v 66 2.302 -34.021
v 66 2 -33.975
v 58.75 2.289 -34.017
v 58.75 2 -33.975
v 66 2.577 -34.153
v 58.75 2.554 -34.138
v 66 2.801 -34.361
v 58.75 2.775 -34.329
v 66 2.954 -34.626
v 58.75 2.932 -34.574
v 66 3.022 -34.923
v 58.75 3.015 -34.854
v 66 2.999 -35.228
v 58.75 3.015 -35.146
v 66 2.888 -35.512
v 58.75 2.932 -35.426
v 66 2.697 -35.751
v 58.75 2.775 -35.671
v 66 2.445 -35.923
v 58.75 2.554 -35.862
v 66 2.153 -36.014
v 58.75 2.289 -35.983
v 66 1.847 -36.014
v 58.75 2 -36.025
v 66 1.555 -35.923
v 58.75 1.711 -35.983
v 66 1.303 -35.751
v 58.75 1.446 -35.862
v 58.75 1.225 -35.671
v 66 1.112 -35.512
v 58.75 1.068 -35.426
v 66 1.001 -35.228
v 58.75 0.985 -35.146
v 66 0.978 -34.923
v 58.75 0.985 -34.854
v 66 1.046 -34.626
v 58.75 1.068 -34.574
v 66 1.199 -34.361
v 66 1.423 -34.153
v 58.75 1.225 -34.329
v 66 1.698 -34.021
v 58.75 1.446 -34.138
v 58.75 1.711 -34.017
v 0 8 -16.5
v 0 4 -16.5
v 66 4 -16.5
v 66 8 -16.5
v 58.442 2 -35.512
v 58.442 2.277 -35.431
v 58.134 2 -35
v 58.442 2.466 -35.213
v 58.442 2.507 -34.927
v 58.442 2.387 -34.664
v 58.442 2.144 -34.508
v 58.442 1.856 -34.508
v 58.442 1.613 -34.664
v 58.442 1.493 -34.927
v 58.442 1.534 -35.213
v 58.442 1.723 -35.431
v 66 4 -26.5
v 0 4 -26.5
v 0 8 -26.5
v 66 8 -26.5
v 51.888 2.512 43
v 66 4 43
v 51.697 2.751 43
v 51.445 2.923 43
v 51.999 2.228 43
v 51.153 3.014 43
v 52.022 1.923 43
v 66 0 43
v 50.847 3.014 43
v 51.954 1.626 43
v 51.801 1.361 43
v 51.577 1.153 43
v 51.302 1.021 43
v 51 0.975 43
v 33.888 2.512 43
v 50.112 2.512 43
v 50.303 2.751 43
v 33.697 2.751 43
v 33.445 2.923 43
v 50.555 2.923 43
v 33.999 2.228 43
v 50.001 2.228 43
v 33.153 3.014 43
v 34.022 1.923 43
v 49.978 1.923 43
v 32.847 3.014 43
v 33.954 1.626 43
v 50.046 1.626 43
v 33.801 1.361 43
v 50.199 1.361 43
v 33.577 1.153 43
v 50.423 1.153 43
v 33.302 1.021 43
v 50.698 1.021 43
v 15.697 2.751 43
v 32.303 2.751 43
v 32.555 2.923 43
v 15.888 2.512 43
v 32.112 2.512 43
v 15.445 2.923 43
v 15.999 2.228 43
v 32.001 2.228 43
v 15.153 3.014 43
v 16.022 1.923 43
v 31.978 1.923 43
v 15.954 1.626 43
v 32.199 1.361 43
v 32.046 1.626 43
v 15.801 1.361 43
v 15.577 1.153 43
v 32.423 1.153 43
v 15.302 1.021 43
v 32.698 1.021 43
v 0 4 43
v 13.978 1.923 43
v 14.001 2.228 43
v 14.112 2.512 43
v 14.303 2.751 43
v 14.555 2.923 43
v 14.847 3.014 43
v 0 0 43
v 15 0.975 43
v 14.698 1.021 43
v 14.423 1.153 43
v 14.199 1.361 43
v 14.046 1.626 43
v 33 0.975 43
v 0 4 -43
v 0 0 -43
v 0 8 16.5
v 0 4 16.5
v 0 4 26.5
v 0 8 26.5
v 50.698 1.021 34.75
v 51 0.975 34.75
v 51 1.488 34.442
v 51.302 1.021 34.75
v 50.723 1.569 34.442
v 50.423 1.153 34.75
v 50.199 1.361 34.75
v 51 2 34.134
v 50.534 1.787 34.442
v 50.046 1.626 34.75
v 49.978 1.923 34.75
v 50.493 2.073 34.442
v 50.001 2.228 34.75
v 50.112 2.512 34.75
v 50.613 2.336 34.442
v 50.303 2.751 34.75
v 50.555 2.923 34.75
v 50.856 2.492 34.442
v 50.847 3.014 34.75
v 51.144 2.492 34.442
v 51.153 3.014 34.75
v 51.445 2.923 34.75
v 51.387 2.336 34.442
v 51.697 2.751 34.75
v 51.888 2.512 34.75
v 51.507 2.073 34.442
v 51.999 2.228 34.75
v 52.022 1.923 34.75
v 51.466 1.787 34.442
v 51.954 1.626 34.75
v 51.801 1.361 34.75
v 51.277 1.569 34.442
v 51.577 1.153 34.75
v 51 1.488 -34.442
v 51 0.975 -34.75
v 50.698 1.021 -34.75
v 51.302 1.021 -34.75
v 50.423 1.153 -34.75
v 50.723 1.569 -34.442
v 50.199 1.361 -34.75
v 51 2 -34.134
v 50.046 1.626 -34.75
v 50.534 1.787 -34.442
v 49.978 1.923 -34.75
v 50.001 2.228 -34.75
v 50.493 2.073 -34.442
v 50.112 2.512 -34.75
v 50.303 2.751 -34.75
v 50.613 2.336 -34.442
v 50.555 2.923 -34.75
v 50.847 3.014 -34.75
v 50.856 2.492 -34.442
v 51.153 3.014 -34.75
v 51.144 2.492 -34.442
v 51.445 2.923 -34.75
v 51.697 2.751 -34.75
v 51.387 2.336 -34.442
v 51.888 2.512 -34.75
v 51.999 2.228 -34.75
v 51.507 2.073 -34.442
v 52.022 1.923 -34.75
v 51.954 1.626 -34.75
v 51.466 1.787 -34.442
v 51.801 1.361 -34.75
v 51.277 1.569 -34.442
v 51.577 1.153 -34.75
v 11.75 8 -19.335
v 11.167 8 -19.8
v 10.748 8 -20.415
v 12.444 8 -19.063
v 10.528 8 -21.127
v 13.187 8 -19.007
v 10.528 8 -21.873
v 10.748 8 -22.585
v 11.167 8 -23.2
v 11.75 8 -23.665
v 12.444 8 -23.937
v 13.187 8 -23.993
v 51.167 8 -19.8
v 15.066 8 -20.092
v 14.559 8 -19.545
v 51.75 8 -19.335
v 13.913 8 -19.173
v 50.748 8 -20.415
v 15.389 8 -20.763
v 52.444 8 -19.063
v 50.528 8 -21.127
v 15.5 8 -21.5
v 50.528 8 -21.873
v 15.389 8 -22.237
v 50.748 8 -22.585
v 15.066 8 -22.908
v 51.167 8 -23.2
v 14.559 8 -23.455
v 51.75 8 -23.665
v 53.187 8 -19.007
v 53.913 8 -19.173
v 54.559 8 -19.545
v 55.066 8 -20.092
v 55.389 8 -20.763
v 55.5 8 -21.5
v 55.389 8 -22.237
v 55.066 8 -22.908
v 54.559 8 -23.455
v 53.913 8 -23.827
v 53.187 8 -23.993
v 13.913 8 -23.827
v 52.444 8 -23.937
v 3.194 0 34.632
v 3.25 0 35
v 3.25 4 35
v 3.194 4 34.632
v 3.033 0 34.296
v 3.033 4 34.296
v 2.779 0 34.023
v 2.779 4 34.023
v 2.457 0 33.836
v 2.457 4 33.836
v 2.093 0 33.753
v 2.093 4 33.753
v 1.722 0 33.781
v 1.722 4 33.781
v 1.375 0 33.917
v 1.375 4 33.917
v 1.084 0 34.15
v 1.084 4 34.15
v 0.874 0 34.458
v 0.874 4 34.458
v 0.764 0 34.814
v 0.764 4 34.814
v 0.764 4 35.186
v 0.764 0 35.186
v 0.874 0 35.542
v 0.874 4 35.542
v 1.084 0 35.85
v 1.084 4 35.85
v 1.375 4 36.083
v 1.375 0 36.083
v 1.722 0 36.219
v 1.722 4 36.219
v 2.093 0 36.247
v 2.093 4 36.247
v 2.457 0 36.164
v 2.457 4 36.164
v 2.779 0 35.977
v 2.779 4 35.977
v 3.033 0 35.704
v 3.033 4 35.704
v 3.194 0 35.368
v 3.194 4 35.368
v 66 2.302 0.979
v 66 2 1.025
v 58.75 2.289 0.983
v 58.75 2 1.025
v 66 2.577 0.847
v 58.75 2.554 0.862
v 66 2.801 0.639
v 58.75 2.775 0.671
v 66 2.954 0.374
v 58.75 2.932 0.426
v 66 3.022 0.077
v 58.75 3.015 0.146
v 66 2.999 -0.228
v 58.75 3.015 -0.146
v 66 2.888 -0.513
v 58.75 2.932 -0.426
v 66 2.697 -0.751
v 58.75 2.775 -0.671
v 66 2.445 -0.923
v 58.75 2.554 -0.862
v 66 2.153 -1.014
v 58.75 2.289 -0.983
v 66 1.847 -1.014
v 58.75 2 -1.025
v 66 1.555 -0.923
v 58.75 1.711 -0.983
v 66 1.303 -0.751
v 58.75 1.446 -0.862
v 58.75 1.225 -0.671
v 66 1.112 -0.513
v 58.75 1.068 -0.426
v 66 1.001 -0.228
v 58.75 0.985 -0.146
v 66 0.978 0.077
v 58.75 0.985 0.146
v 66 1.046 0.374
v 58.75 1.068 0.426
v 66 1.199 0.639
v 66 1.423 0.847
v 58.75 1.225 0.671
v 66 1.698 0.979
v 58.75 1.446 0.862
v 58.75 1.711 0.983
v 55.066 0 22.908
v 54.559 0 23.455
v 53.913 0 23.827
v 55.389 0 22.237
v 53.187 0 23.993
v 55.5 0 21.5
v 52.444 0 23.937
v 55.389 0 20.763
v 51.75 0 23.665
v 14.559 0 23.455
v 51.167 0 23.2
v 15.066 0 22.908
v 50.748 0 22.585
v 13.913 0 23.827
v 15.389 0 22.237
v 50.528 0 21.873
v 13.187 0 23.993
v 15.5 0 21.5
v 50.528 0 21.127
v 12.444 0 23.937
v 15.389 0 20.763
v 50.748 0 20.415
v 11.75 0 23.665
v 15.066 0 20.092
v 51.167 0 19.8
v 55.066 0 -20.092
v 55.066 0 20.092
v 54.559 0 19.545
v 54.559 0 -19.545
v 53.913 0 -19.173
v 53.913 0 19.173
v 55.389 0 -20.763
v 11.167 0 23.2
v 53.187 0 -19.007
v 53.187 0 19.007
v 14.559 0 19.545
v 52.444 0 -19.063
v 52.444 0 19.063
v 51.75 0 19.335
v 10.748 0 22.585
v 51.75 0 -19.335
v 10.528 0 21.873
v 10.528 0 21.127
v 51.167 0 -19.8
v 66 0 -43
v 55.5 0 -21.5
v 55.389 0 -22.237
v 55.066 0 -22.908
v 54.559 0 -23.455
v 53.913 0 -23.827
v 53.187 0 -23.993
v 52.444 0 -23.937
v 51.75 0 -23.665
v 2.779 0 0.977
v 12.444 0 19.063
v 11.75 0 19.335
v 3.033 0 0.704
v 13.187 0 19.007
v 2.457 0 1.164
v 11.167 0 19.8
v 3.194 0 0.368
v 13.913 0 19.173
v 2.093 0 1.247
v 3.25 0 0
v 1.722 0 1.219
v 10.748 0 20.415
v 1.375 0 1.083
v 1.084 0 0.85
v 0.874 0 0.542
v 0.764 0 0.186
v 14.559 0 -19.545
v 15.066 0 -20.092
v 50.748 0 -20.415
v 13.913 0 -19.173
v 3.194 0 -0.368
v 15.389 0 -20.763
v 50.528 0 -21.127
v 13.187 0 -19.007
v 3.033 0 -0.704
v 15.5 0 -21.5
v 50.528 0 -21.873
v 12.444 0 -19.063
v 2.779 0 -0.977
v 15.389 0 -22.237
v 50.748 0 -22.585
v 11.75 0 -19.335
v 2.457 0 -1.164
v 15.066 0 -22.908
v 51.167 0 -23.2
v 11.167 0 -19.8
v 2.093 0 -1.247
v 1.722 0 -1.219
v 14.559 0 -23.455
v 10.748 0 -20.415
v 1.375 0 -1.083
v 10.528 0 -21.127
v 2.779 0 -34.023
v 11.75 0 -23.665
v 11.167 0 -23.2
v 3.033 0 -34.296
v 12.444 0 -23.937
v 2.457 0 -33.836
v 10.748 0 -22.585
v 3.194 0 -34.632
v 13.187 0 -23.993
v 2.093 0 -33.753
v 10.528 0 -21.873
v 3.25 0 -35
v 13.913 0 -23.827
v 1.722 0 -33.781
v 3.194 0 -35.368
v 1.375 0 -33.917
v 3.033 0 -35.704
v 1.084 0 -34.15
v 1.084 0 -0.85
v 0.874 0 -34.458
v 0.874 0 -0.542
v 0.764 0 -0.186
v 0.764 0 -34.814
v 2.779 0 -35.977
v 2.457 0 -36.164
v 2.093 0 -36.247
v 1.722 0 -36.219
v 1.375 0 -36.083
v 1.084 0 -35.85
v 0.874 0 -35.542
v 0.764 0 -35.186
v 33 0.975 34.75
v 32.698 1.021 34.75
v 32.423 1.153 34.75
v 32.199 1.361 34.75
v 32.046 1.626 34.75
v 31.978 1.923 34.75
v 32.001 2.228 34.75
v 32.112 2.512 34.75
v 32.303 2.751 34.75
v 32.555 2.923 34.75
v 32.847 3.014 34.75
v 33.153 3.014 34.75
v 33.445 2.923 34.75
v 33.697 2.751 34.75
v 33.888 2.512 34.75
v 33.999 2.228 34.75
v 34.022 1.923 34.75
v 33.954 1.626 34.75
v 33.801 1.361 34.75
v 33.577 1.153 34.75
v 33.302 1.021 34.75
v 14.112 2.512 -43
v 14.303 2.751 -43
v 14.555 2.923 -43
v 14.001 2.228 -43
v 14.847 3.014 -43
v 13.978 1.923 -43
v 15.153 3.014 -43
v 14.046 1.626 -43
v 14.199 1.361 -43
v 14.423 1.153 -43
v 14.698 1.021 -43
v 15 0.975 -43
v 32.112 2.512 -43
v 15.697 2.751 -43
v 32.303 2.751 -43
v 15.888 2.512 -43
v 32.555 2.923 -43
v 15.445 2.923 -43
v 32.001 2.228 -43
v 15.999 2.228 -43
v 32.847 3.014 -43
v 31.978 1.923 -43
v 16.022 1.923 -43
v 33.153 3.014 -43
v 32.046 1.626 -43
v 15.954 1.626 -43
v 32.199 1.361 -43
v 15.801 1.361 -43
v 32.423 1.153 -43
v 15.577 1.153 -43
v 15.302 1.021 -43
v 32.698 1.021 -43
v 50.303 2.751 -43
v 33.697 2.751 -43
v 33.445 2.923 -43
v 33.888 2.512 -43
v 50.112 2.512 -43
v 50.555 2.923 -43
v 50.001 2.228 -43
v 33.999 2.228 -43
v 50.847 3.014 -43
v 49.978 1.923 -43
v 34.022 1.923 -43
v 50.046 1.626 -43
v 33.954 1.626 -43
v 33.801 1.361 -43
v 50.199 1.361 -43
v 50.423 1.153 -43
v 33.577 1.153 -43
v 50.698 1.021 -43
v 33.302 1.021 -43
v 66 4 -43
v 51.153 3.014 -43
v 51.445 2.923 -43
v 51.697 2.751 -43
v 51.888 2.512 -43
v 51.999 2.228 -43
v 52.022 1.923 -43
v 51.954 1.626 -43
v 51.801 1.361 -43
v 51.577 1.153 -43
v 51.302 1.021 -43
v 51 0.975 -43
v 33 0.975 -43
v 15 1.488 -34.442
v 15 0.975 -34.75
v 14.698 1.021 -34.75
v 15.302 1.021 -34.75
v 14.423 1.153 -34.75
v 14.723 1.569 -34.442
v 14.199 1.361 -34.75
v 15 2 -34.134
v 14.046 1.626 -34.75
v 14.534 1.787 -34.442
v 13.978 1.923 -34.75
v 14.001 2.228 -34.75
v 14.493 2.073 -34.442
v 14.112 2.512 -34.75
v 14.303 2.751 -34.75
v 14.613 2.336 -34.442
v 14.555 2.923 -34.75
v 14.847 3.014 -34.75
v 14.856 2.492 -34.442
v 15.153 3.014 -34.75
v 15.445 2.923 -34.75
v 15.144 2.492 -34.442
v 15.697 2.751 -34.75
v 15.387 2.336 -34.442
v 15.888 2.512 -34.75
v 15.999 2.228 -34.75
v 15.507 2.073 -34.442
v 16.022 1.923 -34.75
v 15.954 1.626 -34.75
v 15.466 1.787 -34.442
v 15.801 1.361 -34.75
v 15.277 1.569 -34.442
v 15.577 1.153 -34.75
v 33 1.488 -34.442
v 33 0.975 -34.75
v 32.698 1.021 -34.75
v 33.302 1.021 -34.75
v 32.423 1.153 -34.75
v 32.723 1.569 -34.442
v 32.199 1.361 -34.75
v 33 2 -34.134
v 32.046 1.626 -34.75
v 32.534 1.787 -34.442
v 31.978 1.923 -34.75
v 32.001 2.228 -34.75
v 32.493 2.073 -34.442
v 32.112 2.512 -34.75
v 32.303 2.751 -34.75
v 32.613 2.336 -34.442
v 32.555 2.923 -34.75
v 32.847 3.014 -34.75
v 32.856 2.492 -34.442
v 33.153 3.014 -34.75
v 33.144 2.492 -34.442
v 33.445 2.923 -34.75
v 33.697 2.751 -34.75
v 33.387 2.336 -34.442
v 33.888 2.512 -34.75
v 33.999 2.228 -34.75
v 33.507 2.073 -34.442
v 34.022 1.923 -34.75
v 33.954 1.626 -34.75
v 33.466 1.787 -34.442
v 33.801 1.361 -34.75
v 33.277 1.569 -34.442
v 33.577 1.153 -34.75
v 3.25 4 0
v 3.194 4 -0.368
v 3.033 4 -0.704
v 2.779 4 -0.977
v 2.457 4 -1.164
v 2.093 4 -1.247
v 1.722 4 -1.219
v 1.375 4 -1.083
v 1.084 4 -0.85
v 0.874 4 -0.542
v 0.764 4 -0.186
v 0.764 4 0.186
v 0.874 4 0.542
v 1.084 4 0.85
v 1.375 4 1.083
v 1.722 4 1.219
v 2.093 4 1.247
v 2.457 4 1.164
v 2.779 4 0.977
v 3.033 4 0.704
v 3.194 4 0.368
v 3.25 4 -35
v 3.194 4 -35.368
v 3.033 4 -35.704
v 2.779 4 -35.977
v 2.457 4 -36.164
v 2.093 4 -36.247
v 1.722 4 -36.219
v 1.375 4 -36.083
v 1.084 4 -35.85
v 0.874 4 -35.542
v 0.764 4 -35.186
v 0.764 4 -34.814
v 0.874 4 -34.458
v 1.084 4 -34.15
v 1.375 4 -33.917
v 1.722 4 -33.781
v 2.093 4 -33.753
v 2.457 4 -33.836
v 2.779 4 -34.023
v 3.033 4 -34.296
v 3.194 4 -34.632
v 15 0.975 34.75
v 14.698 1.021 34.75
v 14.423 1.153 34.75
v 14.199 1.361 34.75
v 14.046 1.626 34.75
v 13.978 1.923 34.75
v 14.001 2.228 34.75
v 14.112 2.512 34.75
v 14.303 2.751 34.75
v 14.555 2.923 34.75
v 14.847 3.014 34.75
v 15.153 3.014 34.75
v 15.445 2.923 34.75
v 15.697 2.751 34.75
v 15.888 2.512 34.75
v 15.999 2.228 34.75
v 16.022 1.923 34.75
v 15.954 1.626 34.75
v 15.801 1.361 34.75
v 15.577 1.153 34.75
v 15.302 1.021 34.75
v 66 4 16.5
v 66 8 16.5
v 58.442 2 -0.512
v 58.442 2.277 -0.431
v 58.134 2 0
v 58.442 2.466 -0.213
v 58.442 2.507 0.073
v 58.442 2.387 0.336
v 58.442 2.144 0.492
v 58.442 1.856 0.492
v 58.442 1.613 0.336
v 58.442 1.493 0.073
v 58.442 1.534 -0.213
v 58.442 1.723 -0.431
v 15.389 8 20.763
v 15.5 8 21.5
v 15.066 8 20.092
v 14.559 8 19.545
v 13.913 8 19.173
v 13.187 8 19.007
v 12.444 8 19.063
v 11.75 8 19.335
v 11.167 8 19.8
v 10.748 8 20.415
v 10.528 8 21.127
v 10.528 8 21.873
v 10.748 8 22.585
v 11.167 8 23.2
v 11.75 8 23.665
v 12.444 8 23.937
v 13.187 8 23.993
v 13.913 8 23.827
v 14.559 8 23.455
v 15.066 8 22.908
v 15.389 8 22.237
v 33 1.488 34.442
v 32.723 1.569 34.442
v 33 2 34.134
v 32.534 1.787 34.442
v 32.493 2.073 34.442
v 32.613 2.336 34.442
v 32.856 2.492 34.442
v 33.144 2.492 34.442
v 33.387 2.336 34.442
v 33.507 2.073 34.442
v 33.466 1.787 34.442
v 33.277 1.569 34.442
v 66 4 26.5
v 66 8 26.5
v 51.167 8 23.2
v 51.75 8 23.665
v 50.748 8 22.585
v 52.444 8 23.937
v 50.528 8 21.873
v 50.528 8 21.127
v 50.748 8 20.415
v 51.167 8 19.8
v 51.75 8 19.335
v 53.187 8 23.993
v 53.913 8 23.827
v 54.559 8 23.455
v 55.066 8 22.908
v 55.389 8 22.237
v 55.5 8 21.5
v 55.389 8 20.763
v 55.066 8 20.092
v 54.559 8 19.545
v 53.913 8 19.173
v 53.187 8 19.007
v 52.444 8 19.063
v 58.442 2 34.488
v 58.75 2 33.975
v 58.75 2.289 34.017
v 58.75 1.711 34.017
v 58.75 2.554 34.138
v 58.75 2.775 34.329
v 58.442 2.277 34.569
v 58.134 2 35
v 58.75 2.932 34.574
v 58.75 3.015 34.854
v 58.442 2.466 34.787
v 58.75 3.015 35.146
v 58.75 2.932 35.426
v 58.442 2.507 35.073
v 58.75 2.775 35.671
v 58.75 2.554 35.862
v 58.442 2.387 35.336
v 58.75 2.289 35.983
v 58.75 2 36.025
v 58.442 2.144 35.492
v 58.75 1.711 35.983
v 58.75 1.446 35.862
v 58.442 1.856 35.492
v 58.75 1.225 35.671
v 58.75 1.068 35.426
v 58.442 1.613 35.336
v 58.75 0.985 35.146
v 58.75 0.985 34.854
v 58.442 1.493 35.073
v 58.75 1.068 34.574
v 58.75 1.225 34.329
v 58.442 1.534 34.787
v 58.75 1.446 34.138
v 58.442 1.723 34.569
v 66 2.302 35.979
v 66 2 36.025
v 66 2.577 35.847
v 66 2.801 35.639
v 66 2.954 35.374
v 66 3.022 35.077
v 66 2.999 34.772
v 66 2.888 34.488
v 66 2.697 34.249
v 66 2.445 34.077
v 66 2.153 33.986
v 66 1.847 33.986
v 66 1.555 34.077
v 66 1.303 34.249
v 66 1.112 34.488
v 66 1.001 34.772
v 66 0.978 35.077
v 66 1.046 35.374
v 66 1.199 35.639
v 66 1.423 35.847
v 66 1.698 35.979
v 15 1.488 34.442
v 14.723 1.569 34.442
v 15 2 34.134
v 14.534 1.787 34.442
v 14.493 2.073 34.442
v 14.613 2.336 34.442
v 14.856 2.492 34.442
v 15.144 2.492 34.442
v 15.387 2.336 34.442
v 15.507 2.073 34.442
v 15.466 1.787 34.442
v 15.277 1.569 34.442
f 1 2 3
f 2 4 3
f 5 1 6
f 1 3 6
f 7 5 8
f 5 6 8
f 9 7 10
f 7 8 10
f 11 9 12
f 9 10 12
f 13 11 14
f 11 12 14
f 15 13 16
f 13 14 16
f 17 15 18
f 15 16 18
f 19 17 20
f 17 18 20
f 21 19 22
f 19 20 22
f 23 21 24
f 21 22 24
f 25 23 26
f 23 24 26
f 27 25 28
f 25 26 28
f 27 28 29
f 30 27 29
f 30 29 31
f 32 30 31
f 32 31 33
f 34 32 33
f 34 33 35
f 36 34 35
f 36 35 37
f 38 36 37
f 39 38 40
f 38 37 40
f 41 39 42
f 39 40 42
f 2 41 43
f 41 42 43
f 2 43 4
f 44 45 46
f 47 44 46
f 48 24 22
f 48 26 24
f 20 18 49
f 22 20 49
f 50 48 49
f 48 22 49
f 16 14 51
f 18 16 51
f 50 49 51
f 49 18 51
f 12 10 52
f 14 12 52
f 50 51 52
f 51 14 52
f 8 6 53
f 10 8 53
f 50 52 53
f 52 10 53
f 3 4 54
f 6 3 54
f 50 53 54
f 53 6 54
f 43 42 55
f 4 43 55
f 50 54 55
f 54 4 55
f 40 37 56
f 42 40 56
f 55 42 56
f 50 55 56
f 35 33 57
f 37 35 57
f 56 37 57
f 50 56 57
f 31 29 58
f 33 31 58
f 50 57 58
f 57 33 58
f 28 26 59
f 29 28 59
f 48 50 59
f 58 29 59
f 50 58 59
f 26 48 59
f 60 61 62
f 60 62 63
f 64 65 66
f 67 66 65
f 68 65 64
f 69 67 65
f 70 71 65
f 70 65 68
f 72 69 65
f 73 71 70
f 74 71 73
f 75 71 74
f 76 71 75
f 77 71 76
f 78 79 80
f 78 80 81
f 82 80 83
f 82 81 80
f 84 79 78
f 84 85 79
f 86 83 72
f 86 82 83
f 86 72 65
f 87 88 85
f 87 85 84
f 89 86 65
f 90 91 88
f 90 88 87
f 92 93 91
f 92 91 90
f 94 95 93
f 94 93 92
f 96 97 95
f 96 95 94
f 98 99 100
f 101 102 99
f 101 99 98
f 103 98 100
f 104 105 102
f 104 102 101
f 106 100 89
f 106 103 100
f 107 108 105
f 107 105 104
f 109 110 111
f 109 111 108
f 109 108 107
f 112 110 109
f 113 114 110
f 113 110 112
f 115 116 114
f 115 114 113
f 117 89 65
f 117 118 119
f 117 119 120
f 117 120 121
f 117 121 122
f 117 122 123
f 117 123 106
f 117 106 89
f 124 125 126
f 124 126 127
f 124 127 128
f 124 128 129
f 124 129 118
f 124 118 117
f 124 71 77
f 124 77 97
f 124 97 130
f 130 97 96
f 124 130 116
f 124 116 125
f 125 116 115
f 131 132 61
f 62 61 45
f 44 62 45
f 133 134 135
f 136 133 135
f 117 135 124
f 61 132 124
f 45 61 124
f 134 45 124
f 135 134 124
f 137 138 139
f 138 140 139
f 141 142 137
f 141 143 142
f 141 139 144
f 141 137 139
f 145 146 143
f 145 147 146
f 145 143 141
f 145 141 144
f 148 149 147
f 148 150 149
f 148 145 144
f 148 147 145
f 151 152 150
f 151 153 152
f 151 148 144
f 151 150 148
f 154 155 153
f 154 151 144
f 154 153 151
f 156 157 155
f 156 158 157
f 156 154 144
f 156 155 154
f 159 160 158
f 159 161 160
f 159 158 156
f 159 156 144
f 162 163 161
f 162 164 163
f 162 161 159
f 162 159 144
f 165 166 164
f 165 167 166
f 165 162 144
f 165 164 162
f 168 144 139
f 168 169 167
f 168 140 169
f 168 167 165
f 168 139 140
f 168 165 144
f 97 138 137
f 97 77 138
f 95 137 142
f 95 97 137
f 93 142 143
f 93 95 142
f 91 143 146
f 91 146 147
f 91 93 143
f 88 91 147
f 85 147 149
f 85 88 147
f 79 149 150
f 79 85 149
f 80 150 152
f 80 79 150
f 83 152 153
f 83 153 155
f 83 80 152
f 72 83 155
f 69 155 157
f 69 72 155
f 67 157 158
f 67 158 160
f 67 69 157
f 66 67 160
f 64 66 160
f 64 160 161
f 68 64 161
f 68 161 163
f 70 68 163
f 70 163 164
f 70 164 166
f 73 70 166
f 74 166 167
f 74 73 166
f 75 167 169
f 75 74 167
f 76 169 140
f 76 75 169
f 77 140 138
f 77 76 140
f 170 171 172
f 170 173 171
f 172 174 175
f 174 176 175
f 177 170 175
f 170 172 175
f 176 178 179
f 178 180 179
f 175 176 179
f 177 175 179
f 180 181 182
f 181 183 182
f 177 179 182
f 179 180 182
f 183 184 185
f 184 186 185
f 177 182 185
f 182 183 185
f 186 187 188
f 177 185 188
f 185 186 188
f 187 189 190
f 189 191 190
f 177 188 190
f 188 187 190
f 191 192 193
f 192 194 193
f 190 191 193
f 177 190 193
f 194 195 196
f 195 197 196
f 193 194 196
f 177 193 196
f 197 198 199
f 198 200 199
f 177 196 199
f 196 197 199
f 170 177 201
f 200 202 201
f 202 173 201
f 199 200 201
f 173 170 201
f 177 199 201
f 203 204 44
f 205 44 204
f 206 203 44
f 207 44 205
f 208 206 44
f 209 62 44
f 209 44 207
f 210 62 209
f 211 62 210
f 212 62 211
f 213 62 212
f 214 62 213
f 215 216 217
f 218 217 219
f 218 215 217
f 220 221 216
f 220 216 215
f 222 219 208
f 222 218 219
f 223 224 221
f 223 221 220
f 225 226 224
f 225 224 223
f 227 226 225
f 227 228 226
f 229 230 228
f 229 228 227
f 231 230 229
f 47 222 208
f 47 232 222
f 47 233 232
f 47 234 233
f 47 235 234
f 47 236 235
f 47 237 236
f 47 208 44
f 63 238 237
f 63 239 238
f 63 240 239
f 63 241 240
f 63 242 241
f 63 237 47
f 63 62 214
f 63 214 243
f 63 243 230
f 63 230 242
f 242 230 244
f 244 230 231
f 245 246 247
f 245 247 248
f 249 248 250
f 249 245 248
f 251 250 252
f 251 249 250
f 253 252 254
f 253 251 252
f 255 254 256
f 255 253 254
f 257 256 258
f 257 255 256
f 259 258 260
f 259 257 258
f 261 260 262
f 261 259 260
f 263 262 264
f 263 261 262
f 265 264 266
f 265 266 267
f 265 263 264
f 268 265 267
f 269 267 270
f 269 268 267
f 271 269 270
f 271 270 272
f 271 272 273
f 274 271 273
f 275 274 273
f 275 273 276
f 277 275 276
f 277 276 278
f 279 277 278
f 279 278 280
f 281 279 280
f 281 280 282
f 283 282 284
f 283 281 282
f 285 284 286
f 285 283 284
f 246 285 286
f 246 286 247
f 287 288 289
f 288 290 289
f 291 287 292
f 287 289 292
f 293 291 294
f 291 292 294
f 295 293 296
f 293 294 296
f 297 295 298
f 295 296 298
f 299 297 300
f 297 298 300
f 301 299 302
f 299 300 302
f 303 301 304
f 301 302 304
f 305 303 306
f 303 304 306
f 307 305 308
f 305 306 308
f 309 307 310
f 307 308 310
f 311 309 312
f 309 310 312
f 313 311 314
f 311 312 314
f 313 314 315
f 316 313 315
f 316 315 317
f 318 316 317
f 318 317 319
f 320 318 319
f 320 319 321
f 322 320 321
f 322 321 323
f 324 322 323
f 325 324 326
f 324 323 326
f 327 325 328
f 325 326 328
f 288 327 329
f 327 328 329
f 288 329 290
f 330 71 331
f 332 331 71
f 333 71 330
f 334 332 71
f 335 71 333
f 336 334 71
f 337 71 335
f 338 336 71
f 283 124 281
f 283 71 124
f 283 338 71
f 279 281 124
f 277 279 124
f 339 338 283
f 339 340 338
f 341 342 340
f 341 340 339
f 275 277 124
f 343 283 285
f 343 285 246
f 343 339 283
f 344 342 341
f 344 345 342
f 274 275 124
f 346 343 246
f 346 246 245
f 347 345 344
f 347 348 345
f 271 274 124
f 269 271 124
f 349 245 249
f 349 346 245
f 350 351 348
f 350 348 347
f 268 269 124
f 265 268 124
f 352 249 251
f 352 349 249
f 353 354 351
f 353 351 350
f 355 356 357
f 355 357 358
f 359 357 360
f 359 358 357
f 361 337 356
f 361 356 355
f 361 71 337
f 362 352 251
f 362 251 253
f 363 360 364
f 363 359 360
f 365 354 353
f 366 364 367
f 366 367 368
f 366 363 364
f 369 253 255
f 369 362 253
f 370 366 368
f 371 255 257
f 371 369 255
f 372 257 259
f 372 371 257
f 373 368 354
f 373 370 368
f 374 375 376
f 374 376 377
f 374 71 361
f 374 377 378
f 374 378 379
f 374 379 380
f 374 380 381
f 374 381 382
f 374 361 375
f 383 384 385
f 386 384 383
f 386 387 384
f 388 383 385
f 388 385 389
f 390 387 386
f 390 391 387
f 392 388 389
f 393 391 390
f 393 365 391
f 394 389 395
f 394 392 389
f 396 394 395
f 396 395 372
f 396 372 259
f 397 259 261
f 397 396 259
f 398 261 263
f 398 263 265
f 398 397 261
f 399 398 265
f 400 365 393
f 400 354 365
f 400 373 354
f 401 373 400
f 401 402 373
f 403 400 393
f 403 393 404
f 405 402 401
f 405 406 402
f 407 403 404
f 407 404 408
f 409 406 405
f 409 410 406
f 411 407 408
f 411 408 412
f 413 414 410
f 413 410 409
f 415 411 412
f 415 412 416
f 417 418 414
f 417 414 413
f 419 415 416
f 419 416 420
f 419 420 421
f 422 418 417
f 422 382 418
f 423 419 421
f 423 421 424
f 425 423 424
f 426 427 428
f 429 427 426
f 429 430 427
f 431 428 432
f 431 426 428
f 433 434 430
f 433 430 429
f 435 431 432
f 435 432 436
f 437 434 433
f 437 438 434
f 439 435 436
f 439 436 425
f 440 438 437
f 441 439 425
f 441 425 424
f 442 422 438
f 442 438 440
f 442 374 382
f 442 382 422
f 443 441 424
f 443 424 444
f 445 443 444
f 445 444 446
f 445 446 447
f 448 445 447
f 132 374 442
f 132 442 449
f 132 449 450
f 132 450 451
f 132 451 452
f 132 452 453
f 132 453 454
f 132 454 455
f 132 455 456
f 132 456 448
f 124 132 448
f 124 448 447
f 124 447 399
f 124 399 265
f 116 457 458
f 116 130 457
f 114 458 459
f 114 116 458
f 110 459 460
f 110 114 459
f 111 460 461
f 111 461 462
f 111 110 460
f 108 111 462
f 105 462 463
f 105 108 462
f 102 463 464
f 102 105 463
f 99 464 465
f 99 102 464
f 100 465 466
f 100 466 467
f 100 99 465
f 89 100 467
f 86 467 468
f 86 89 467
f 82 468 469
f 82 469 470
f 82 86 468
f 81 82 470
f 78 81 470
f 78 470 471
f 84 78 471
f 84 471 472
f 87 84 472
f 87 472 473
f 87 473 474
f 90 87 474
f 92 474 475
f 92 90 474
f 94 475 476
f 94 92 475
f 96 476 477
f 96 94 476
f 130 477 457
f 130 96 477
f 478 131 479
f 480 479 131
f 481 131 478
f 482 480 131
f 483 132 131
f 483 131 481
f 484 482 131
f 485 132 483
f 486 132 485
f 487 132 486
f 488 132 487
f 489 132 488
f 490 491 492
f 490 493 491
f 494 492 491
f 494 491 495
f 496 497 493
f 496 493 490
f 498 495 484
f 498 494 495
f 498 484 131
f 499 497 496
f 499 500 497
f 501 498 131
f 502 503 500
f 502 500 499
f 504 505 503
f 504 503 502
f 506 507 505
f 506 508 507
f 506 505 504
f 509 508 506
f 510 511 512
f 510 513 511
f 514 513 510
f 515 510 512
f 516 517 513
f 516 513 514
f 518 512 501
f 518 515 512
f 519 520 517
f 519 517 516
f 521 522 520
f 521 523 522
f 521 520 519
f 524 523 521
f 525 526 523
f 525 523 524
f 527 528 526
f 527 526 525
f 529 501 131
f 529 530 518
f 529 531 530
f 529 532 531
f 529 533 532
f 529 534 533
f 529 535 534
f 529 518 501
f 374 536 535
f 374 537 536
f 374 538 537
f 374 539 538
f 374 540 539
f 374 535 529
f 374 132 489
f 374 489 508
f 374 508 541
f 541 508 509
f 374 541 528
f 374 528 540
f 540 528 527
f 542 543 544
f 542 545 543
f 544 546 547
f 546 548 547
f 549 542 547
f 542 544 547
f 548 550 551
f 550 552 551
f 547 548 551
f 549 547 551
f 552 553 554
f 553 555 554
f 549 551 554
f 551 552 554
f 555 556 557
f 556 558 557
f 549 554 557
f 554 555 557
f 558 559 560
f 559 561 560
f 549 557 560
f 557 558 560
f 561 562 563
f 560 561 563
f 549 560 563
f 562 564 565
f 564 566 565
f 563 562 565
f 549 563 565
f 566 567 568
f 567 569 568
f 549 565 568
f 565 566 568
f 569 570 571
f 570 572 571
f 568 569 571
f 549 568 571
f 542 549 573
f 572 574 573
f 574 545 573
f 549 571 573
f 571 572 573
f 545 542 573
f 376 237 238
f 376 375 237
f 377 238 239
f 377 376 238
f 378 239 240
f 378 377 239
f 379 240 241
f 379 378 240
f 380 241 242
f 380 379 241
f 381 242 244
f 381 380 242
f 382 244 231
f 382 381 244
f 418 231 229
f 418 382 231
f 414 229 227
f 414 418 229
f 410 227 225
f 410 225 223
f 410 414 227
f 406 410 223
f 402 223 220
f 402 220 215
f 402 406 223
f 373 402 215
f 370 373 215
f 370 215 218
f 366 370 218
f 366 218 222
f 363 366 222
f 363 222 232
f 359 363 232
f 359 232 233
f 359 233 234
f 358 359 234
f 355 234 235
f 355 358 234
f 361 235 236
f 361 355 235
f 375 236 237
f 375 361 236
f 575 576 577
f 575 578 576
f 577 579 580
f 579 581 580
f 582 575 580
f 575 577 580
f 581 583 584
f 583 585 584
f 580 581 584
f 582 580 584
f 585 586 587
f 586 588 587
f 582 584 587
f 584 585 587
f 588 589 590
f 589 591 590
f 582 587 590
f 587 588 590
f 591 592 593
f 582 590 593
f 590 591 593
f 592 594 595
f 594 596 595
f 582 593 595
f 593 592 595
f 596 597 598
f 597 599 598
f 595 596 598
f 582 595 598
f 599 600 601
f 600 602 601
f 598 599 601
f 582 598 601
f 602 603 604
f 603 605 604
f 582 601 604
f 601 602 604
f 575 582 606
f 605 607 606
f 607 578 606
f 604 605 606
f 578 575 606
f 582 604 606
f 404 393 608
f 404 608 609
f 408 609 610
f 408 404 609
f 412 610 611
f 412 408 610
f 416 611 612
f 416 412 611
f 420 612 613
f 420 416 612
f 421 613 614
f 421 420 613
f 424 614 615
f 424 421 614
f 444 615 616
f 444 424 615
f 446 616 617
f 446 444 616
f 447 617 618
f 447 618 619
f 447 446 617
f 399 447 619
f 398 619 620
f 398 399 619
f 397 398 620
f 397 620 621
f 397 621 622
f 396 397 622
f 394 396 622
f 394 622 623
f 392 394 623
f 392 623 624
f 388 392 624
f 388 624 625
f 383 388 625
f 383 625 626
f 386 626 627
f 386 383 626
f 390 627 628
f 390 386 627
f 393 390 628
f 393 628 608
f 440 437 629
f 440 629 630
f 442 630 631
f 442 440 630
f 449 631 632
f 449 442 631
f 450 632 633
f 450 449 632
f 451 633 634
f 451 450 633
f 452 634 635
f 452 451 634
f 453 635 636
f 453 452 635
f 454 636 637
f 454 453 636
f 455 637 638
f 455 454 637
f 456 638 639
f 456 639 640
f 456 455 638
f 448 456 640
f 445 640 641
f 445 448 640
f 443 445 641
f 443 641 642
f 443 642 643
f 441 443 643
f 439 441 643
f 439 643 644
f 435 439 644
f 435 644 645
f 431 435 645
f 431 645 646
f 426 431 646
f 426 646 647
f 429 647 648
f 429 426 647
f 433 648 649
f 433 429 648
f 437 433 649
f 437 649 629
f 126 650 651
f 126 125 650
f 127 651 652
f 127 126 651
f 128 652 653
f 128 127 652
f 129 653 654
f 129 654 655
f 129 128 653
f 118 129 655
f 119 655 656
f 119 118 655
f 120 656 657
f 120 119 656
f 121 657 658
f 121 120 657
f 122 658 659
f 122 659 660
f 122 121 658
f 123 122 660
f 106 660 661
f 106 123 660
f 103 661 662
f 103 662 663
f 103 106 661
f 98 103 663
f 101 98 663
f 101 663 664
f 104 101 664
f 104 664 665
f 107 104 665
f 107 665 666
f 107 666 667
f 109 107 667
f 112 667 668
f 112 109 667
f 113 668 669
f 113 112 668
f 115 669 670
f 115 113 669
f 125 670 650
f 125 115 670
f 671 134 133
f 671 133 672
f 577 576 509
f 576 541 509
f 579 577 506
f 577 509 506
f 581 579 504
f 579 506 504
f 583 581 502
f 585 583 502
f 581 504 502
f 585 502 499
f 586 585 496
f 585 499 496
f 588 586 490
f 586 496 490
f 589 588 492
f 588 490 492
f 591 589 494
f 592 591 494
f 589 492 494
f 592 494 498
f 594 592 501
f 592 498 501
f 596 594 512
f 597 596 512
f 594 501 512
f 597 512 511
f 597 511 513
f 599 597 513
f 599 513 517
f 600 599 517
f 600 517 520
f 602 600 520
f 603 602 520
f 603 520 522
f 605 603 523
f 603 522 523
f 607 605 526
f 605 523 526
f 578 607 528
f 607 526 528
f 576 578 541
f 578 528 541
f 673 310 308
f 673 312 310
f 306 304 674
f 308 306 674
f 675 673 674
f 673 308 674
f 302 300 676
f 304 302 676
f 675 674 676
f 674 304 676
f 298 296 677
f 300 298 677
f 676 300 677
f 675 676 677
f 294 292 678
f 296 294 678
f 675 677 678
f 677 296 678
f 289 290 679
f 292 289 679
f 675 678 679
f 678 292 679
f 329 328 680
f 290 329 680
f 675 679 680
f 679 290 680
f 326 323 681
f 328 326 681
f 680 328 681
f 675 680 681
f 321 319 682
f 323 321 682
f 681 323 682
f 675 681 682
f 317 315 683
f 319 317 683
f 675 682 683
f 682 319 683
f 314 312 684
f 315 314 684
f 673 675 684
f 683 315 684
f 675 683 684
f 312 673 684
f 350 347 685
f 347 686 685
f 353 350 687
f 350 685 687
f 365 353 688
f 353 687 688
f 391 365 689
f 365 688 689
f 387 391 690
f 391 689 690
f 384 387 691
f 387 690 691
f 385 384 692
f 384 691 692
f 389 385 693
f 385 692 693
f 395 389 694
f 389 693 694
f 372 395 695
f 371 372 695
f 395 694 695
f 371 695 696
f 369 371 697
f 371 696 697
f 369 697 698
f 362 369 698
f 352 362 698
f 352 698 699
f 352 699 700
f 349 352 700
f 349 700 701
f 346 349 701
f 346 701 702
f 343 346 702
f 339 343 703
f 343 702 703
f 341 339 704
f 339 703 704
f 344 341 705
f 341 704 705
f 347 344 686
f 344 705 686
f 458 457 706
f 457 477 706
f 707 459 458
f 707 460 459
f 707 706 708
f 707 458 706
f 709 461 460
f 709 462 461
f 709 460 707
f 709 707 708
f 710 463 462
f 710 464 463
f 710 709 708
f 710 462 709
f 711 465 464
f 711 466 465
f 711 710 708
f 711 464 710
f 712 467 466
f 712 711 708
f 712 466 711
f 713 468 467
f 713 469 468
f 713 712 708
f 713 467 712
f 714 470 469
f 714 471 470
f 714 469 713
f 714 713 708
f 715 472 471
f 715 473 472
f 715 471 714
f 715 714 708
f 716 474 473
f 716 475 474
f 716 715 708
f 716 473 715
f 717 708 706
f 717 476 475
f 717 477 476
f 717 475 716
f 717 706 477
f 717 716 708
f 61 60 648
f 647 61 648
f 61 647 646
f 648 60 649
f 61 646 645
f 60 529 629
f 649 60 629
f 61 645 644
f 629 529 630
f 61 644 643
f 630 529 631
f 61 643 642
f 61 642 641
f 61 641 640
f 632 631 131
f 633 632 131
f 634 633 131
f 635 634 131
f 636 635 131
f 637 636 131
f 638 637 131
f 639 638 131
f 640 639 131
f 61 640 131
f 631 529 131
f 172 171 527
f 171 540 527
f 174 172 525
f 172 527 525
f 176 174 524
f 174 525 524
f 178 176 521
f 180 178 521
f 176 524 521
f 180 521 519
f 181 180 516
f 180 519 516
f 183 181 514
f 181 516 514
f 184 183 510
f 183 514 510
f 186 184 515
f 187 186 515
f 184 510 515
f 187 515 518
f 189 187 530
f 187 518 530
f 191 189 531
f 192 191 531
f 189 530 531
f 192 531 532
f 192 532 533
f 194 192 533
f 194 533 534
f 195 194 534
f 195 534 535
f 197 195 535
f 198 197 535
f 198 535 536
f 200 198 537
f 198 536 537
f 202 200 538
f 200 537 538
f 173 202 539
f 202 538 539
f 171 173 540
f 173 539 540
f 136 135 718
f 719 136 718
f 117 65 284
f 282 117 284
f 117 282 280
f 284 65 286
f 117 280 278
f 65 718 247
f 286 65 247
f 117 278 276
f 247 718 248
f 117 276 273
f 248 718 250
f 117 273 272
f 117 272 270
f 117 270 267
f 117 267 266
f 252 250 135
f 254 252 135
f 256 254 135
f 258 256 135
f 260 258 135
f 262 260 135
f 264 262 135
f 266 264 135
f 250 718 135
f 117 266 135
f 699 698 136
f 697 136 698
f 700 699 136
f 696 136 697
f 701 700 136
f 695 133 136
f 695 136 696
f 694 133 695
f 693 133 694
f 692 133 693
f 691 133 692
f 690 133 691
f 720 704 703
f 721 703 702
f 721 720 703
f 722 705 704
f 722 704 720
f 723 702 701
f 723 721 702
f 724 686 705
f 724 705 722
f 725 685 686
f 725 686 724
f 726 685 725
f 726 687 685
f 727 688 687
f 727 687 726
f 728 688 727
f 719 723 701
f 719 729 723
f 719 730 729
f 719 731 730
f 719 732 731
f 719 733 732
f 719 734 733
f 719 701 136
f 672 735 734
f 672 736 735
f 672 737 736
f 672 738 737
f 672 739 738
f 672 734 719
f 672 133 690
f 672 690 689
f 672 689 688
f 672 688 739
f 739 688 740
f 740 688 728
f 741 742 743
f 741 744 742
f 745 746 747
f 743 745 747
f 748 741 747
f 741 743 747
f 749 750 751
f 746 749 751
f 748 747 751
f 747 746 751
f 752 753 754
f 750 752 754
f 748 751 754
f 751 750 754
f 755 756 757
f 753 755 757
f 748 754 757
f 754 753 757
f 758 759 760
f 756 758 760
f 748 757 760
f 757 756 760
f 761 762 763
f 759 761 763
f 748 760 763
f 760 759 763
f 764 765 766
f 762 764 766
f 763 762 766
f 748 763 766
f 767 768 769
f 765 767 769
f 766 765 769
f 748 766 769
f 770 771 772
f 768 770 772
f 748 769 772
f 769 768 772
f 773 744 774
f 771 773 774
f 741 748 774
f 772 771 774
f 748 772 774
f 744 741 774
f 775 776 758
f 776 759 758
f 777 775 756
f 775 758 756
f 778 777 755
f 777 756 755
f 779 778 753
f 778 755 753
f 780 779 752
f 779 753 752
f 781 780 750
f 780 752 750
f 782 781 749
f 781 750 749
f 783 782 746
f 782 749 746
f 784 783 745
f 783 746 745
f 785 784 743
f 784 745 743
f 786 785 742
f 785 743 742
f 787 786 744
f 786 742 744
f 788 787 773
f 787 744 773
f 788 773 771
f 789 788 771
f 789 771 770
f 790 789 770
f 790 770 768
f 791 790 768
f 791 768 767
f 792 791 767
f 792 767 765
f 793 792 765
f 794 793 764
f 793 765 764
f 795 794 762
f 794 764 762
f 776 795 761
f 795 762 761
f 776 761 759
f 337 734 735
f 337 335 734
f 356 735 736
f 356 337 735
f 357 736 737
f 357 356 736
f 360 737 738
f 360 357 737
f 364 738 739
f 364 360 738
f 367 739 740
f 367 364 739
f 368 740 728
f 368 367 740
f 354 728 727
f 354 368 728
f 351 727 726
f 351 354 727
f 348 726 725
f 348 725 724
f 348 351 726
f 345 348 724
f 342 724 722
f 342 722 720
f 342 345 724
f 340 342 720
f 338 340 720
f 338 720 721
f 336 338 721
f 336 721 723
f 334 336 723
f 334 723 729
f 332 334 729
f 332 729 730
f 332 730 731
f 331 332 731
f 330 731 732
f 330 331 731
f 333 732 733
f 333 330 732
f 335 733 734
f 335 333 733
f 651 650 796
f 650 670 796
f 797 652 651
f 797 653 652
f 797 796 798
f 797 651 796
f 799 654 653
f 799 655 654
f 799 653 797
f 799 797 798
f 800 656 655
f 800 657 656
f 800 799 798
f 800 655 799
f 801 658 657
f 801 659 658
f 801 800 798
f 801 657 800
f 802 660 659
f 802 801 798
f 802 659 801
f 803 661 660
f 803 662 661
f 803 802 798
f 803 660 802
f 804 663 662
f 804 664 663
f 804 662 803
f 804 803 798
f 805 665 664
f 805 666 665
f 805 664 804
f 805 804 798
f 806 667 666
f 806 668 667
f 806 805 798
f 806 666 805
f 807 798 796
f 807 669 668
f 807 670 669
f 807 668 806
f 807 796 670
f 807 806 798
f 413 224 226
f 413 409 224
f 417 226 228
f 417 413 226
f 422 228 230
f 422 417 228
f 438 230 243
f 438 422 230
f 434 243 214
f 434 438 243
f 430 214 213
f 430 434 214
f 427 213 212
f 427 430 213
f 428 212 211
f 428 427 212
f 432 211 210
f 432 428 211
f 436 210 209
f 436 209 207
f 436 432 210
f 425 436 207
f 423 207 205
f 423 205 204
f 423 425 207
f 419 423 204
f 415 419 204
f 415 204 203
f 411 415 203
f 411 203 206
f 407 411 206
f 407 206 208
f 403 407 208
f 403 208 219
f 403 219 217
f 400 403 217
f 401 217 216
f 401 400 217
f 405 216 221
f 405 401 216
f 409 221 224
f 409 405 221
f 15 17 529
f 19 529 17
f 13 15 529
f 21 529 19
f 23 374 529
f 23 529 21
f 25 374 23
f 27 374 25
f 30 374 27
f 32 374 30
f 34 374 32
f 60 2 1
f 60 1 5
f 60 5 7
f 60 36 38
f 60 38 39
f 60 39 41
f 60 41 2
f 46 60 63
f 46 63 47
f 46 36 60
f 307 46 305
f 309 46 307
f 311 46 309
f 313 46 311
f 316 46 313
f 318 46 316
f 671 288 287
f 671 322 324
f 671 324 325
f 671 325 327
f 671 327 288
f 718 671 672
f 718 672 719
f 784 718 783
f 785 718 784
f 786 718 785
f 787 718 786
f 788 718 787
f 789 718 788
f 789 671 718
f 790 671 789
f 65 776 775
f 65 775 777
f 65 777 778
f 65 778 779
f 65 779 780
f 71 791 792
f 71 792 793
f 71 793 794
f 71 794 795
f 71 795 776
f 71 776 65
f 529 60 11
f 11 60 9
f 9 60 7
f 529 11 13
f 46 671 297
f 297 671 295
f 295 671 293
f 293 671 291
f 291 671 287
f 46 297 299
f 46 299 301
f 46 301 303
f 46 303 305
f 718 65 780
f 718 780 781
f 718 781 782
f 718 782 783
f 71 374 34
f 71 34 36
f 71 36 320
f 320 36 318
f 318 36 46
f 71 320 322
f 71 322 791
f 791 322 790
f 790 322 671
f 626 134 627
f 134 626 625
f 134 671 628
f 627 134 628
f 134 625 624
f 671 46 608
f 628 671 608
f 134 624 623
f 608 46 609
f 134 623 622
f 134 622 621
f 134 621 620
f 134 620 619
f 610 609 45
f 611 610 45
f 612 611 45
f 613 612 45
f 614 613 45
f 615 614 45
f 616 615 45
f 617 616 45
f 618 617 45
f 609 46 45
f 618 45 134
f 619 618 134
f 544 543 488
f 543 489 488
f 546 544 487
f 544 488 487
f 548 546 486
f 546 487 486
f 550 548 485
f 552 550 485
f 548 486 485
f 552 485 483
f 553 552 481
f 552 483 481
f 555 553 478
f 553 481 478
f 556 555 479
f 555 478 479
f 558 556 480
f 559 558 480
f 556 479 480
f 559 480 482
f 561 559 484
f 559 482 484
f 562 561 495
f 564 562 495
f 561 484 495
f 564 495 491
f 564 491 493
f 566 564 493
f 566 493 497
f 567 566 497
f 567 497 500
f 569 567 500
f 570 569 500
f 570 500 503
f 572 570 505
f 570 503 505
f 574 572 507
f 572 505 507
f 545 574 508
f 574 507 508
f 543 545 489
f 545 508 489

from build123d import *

# Parameters (mm, degrees)
SKETCH_1_R                    = 1.25
EXTRUDE_1_DEPTH               = 4
HOLE_WIZARD_M2_5_1_AT_2_COUNT = 2
HOLE_WIZARD_M2_5_1_AT_2_PITCH = 18
HOLE_WIZARD_M2_5_1_AT_3_COUNT = 2
HOLE_WIZARD_M2_5_1_AT_3_PITCH = 36
SKETCH_7_W                    = 66
SKETCH_7_H                    = 10
EXTRUDE_2_DEPTH               = 4
SKETCH_7_3_R                  = 2.5
CUT_EXTRUDE_1_DEPTH           = 4
HOLE_WIZARD_M2_5_2_D          = 2.05
HOLE_WIZARD_M2_5_2_DEPTH      = 7.25
HOLE_WIZARD_M2_5_2_TIP        = 0.615882135


with BuildPart() as part:
    # 草图1 → 凸台-拉伸1 (new body)
    with BuildSketch(Plane(origin=(0, 0, 0), x_dir=(1, 0, 0), z_dir=(0, 1, 0))):
        Polygon((0, 0), (0, 43), (66, 43), (66, -43), (0, -43), align=None)
        with Locations((2, 0)):
            Circle(SKETCH_1_R, mode=Mode.SUBTRACT)
        with Locations((2, 35)):
            Circle(SKETCH_1_R, mode=Mode.SUBTRACT)
        with Locations((2, -35)):
            Circle(SKETCH_1_R, mode=Mode.SUBTRACT)
    extrude(amount=EXTRUDE_1_DEPTH)

    # 草图6 → M2.5 螺纹孔1 (revolve, cut)
    with BuildSketch(Plane(origin=(15, 2, 43), x_dir=(0, -1, 0), z_dir=(1, 0, 0))):
        Polygon((0, 0), (0, 8.865882135), (1.025, 8.25), (1.025, 0), align=None)
    hole_wizard_m2_5_1 = revolve(axis=Axis((15, 2, 49.35), (0, 0, -1)), mode=Mode.SUBTRACT)

    # M2.5 螺纹孔1 at 2: M2.5 螺纹孔1 ×2
    with Locations(*[(i * HOLE_WIZARD_M2_5_1_AT_2_PITCH, 0, 0) for i in range(1, HOLE_WIZARD_M2_5_1_AT_2_COUNT)]):
        add(hole_wizard_m2_5_1, mode=Mode.SUBTRACT)

    # M2.5 螺纹孔1 at 3: M2.5 螺纹孔1 ×2
    with Locations(*[(i * HOLE_WIZARD_M2_5_1_AT_3_PITCH, 0, 0) for i in range(1, HOLE_WIZARD_M2_5_1_AT_3_COUNT)]):
        add(hole_wizard_m2_5_1, mode=Mode.SUBTRACT)

    # 镜向1: M2.5 螺纹孔1 across plane
    add(hole_wizard_m2_5_1.mirror(Plane.XY), mode=Mode.SUBTRACT)

    # 镜向1 copy 1 sketch → 镜向1 copy 1 (revolve, cut)
    with BuildSketch(Plane(origin=(33, 2, -43), x_dir=(0, -1, 0), z_dir=(1, 0, 0))):
        Polygon((0, 0), (0, -8.865882135), (1.025, -8.25), (1.025, 0), align=None)
    revolve(axis=Axis((33, 2, -49.35), (0, 0, -1)), mode=Mode.SUBTRACT)

    # 镜向1 copy 2 sketch → 镜向1 copy 2 (revolve, cut)
    with BuildSketch(Plane(origin=(51, 2, -43), x_dir=(0, -1, 0), z_dir=(1, 0, 0))):
        Polygon((0, 0), (0, -8.865882135), (1.025, -8.25), (1.025, 0), align=None)
    revolve(axis=Axis((51, 2, -49.35), (0, 0, -1)), mode=Mode.SUBTRACT)

    # 草图7 → 凸台-拉伸2 (add)
    with BuildSketch(Plane(origin=(0, 4, 0), x_dir=(1, 0, 0), z_dir=(0, 1, 0))):
        with Locations((33, 21.5)):
            Rectangle(SKETCH_7_W, SKETCH_7_H)
        with Locations((33, -21.5)):
            Rectangle(SKETCH_7_W, SKETCH_7_H)
    extrude(amount=EXTRUDE_2_DEPTH)

    # 草图7<3> → 切除-拉伸1 (cut, symmetric)
    with BuildSketch(Plane(origin=(0, 4, 0), x_dir=(1, 0, 0), z_dir=(0, 1, 0))):
        with Locations((13, 21.5)):
            Circle(SKETCH_7_3_R)
        with Locations((53, 21.5)):
            Circle(SKETCH_7_3_R)
        with Locations((53, -21.5)):
            Circle(SKETCH_7_3_R)
        with Locations((13, -21.5)):
            Circle(SKETCH_7_3_R)
    extrude(amount=CUT_EXTRUDE_1_DEPTH, both=True, mode=Mode.SUBTRACT)

    # M2.5 螺纹孔2
    with Locations(Plane(origin=(66, 0, 0), x_dir=(0, 0, -1), z_dir=(1, 0, 0))):
        with Locations((-35, 2), (0, 2), (35, 2)):
            Hole(HOLE_WIZARD_M2_5_2_D / 2, depth=HOLE_WIZARD_M2_5_2_DEPTH)
            with Locations((0, 0, -(HOLE_WIZARD_M2_5_2_DEPTH + HOLE_WIZARD_M2_5_2_TIP / 2))):  # 118° drill point
                Cone(0, HOLE_WIZARD_M2_5_2_D / 2, HOLE_WIZARD_M2_5_2_TIP, mode=Mode.SUBTRACT)


solid = part.part
